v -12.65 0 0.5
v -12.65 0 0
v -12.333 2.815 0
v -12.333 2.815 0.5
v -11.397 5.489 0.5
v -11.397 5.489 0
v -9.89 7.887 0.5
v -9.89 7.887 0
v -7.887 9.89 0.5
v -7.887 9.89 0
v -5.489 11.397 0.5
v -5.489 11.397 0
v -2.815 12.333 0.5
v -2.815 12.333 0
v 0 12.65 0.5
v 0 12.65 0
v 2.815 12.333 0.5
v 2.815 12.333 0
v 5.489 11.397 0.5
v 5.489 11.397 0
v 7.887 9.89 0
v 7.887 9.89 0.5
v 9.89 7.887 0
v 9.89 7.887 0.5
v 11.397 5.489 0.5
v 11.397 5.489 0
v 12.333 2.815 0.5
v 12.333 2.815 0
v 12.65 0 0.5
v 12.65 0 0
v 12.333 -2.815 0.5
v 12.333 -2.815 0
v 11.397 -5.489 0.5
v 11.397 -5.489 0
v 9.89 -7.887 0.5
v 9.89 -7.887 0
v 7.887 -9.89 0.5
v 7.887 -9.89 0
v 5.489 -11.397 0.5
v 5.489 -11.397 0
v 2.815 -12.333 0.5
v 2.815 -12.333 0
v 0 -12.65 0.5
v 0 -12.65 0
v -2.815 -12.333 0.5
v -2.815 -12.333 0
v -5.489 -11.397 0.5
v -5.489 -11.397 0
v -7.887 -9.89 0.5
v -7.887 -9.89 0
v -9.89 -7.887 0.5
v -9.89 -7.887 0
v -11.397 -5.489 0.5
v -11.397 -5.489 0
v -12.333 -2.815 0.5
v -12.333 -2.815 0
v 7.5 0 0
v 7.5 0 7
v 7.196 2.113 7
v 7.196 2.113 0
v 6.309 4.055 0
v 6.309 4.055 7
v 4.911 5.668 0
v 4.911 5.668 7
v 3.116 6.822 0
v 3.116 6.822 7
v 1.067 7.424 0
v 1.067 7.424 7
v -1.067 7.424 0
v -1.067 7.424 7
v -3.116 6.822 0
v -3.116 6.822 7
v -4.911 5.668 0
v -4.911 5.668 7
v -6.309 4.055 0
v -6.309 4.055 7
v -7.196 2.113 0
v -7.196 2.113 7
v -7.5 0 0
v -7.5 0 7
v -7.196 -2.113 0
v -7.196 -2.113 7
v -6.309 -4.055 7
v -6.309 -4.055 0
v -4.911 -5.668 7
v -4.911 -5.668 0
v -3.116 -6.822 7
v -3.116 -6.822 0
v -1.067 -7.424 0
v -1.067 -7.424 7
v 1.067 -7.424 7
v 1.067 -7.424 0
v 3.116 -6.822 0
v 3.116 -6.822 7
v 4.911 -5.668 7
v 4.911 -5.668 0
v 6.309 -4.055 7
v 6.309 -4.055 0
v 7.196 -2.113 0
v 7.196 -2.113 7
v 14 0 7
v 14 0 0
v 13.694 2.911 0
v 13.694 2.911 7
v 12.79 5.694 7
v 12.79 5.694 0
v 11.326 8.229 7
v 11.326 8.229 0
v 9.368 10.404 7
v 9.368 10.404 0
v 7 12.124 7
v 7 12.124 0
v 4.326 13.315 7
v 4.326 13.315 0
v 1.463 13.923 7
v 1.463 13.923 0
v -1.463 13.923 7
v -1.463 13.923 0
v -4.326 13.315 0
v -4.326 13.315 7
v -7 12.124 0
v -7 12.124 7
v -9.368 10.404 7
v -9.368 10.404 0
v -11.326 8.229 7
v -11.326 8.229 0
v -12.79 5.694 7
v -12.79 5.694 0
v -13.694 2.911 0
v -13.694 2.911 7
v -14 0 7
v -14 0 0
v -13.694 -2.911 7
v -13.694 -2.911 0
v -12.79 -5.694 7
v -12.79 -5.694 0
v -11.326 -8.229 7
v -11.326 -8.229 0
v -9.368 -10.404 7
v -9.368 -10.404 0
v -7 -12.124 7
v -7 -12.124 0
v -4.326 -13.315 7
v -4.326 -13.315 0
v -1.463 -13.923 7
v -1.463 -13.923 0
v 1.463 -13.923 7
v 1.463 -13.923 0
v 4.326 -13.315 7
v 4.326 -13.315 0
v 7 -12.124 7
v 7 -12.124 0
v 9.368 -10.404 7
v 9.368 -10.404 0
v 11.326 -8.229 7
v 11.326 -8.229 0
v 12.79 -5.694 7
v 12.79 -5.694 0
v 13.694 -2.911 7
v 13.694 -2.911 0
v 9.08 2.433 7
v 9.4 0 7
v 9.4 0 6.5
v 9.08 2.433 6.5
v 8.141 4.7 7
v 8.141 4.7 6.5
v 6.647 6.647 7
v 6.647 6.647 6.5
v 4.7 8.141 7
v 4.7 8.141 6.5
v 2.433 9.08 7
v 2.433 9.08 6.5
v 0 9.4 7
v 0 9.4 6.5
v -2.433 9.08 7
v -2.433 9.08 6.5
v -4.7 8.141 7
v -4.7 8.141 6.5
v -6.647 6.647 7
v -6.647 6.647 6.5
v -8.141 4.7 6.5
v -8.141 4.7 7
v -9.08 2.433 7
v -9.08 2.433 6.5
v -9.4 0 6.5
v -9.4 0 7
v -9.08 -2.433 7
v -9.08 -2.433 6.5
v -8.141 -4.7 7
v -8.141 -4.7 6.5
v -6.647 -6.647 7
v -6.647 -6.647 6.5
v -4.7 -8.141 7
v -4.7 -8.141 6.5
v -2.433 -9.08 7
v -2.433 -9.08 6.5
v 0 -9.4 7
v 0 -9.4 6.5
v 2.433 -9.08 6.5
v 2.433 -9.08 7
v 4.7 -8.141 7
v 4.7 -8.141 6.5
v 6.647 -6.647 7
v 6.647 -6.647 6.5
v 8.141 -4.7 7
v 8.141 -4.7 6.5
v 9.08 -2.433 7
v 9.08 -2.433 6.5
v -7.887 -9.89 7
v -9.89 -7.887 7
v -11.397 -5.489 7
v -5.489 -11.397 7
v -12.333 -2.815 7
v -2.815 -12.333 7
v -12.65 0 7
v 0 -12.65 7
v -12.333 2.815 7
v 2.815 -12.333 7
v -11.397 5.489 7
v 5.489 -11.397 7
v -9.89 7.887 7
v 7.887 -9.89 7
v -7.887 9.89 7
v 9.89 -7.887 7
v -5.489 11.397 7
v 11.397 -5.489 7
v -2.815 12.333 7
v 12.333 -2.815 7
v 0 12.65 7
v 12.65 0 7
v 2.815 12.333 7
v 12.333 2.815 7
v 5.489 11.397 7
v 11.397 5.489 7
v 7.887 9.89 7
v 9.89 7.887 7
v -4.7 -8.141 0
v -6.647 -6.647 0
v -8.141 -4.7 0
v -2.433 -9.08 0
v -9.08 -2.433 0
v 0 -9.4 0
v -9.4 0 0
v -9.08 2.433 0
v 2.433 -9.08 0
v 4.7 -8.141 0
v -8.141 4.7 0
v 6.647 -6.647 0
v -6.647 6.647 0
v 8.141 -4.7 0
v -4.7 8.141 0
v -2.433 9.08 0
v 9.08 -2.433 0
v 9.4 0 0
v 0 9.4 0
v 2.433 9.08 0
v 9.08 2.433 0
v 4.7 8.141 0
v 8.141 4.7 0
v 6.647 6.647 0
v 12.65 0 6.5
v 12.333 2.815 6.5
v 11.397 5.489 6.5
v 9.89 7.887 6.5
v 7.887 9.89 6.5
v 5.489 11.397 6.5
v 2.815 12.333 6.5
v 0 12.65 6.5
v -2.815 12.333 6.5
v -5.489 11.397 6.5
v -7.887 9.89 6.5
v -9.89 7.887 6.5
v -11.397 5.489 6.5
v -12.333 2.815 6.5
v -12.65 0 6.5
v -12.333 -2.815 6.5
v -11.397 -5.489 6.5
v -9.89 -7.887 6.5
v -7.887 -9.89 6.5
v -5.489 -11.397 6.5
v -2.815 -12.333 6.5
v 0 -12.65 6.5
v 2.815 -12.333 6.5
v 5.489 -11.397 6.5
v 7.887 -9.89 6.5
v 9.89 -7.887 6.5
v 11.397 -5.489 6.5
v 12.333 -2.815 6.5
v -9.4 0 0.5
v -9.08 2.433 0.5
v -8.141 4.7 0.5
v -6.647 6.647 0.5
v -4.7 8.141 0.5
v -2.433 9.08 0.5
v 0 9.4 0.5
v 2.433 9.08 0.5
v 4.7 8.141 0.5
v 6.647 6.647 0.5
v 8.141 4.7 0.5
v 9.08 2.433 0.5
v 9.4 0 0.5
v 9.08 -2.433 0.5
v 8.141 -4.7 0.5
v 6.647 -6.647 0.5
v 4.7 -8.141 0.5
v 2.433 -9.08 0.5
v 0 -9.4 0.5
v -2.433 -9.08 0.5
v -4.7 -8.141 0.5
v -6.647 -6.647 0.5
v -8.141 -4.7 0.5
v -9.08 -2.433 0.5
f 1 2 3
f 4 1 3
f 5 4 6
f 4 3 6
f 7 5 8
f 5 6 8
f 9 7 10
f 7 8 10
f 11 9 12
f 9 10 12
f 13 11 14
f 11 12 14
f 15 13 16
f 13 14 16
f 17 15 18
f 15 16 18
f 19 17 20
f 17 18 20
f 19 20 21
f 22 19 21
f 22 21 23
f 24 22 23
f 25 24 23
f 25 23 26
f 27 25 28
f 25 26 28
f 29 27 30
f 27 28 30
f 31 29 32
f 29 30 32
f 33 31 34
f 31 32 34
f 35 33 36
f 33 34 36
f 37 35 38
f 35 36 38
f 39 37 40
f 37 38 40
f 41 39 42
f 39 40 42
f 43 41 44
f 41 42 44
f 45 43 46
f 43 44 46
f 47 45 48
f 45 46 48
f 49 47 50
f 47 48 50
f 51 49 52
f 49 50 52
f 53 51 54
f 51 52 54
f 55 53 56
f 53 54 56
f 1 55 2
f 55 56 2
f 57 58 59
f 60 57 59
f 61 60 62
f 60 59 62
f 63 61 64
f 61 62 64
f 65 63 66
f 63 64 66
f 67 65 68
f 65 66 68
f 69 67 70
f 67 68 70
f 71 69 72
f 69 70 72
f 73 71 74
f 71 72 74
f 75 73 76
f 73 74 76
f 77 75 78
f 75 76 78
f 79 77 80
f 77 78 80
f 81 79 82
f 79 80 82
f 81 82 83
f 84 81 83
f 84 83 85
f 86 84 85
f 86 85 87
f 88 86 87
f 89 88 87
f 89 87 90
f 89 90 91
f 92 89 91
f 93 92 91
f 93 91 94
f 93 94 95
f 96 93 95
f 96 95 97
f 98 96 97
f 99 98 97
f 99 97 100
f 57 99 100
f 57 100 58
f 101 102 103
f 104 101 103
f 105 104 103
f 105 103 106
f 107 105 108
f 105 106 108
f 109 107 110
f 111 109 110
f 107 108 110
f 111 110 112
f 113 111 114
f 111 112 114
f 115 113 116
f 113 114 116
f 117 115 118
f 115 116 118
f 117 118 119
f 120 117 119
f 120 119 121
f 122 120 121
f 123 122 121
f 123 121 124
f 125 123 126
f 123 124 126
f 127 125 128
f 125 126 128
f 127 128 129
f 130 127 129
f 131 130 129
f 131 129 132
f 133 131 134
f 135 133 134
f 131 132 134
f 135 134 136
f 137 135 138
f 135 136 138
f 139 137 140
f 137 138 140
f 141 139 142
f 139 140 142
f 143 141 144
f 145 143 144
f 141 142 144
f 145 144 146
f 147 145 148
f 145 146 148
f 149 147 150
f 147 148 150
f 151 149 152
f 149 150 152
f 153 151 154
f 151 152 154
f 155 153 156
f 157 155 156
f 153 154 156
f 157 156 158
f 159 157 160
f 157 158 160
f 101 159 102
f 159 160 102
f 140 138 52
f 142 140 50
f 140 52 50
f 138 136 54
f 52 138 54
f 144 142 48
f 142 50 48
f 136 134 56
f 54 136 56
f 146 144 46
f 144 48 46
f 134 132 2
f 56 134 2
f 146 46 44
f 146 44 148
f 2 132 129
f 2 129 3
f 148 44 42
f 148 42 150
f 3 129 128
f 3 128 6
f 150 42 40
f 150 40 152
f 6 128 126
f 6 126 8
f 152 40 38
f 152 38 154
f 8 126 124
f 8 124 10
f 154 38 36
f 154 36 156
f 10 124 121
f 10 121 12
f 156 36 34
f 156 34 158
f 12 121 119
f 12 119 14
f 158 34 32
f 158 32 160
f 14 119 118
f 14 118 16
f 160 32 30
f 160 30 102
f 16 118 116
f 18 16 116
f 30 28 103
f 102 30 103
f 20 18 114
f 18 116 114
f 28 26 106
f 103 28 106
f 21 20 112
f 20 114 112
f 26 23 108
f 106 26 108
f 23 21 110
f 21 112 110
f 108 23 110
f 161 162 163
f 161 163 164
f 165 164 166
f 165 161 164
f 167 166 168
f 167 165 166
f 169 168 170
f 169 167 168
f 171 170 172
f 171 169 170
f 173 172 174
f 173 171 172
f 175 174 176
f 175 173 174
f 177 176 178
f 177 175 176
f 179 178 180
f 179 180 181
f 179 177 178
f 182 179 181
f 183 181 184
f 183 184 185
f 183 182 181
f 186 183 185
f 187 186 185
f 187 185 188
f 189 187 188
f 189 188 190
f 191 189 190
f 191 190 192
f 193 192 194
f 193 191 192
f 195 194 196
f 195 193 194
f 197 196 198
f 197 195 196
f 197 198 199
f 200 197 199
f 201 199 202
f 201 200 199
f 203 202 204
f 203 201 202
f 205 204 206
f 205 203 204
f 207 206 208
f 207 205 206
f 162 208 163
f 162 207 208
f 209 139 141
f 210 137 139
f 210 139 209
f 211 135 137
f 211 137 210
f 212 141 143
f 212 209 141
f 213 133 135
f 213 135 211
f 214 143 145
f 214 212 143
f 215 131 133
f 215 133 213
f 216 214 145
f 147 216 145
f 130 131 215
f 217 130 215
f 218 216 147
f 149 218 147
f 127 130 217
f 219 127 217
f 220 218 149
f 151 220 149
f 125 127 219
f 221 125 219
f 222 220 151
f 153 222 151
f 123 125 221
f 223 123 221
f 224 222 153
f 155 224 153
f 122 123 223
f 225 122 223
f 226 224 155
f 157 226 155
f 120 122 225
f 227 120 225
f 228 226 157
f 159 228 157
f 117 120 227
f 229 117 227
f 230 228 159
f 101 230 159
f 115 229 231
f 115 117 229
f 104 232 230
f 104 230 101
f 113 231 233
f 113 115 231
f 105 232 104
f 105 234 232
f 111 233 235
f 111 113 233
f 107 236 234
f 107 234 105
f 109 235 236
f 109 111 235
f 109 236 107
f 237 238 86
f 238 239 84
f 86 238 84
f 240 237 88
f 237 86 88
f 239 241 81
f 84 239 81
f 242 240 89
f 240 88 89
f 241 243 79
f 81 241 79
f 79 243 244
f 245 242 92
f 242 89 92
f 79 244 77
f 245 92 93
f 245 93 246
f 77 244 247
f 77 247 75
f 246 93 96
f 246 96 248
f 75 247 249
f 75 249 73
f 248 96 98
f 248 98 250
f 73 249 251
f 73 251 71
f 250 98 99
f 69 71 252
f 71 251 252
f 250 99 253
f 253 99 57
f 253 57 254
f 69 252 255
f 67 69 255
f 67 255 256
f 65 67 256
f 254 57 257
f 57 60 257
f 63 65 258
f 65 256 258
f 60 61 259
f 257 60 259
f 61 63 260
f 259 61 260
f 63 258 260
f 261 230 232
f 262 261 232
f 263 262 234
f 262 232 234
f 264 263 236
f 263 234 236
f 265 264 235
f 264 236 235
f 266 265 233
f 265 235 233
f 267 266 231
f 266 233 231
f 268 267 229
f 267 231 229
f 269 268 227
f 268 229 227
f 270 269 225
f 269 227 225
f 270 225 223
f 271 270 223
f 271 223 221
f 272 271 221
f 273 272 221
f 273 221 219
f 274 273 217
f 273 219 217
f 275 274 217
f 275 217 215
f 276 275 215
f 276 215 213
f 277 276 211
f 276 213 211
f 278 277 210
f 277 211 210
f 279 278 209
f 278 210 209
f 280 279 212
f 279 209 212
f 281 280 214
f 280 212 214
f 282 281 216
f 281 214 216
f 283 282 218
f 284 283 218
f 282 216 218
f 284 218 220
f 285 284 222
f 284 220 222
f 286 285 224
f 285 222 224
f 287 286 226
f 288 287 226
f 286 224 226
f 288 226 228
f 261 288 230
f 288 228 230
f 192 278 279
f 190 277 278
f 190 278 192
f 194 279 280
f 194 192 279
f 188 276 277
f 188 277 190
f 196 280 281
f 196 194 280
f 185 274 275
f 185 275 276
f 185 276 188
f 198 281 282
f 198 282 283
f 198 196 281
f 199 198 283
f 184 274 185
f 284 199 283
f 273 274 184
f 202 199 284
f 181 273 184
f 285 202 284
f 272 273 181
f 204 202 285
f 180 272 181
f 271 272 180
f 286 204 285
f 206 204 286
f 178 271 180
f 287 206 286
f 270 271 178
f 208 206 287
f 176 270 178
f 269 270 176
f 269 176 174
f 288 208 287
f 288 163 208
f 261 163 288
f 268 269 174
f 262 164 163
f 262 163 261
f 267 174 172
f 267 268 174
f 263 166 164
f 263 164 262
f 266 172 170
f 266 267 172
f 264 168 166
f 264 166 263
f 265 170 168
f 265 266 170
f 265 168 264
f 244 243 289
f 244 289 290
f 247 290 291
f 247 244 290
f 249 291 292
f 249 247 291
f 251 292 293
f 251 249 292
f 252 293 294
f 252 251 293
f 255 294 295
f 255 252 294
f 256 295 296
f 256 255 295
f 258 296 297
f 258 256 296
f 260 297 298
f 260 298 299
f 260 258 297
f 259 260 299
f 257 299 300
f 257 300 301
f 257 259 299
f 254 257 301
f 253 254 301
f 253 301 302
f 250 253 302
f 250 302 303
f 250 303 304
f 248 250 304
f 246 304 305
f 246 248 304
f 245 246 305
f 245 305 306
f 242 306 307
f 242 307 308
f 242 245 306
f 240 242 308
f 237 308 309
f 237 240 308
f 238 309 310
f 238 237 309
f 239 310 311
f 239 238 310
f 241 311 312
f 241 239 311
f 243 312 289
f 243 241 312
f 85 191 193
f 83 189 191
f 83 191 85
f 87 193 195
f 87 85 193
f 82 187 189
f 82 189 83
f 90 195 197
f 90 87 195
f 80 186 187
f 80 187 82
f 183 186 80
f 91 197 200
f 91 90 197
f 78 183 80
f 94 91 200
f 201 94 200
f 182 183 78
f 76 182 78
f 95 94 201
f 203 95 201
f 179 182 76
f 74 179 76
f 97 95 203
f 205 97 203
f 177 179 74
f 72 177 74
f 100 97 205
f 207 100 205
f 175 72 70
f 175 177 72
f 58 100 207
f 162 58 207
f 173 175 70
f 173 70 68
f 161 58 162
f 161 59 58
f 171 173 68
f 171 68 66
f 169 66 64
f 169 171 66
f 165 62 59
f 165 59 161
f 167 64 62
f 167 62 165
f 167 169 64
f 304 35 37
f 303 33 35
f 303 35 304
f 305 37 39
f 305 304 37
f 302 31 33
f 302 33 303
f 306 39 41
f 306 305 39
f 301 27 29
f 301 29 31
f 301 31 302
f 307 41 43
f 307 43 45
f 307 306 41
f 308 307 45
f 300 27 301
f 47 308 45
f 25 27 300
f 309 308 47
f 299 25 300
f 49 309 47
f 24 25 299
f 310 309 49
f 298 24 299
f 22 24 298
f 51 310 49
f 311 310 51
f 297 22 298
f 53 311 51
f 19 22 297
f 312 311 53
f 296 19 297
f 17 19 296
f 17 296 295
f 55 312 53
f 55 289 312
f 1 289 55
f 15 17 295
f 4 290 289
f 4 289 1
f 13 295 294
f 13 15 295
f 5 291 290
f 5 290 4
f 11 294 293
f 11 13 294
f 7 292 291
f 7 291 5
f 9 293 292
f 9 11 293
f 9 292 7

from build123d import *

# Parameters (mm, degrees)
SKETCH_1_R          = 14
EXTRUDE_1_DEPTH     = 7
SKETCH_2_R          = 7.5
CUT_EXTRUDE_1_DEPTH = 8
SKETCH_3_R          = 12.65
SKETCH_3_R_2        = 9.4
CUT_EXTRUDE_2_DEPTH = 0.5
SKETCH_4_R          = 12.65
SKETCH_4_R_2        = 9.4
CUT_EXTRUDE_3_DEPTH = 0.5


with BuildPart() as part:
    # 草圖1 → 填料-伸長1 (new body)
    with BuildSketch(Plane.XY):
        Circle(SKETCH_1_R)
    extrude(amount=EXTRUDE_1_DEPTH)

    # 草圖2 → 除料-伸長1 (cut, through all)
    with BuildSketch(Plane.XY.offset(7)):
        Circle(SKETCH_2_R)
    extrude(amount=-CUT_EXTRUDE_1_DEPTH, mode=Mode.SUBTRACT)

    # 草圖3 → 除料-伸長2 (cut)
    with BuildSketch(Plane.XY.offset(7)):
        Circle(SKETCH_3_R)
        Circle(SKETCH_3_R_2, mode=Mode.SUBTRACT)
    extrude(amount=-CUT_EXTRUDE_2_DEPTH, mode=Mode.SUBTRACT)

    # 草圖4 → 除料-伸長3 (cut)
    with BuildSketch(Plane(origin=(0, 0, 0), x_dir=(-1, 0, 0), z_dir=(0, 0, -1))):
        Circle(SKETCH_4_R)
        Circle(SKETCH_4_R_2, mode=Mode.SUBTRACT)
    extrude(amount=-CUT_EXTRUDE_3_DEPTH, mode=Mode.SUBTRACT)


solid = part.part
